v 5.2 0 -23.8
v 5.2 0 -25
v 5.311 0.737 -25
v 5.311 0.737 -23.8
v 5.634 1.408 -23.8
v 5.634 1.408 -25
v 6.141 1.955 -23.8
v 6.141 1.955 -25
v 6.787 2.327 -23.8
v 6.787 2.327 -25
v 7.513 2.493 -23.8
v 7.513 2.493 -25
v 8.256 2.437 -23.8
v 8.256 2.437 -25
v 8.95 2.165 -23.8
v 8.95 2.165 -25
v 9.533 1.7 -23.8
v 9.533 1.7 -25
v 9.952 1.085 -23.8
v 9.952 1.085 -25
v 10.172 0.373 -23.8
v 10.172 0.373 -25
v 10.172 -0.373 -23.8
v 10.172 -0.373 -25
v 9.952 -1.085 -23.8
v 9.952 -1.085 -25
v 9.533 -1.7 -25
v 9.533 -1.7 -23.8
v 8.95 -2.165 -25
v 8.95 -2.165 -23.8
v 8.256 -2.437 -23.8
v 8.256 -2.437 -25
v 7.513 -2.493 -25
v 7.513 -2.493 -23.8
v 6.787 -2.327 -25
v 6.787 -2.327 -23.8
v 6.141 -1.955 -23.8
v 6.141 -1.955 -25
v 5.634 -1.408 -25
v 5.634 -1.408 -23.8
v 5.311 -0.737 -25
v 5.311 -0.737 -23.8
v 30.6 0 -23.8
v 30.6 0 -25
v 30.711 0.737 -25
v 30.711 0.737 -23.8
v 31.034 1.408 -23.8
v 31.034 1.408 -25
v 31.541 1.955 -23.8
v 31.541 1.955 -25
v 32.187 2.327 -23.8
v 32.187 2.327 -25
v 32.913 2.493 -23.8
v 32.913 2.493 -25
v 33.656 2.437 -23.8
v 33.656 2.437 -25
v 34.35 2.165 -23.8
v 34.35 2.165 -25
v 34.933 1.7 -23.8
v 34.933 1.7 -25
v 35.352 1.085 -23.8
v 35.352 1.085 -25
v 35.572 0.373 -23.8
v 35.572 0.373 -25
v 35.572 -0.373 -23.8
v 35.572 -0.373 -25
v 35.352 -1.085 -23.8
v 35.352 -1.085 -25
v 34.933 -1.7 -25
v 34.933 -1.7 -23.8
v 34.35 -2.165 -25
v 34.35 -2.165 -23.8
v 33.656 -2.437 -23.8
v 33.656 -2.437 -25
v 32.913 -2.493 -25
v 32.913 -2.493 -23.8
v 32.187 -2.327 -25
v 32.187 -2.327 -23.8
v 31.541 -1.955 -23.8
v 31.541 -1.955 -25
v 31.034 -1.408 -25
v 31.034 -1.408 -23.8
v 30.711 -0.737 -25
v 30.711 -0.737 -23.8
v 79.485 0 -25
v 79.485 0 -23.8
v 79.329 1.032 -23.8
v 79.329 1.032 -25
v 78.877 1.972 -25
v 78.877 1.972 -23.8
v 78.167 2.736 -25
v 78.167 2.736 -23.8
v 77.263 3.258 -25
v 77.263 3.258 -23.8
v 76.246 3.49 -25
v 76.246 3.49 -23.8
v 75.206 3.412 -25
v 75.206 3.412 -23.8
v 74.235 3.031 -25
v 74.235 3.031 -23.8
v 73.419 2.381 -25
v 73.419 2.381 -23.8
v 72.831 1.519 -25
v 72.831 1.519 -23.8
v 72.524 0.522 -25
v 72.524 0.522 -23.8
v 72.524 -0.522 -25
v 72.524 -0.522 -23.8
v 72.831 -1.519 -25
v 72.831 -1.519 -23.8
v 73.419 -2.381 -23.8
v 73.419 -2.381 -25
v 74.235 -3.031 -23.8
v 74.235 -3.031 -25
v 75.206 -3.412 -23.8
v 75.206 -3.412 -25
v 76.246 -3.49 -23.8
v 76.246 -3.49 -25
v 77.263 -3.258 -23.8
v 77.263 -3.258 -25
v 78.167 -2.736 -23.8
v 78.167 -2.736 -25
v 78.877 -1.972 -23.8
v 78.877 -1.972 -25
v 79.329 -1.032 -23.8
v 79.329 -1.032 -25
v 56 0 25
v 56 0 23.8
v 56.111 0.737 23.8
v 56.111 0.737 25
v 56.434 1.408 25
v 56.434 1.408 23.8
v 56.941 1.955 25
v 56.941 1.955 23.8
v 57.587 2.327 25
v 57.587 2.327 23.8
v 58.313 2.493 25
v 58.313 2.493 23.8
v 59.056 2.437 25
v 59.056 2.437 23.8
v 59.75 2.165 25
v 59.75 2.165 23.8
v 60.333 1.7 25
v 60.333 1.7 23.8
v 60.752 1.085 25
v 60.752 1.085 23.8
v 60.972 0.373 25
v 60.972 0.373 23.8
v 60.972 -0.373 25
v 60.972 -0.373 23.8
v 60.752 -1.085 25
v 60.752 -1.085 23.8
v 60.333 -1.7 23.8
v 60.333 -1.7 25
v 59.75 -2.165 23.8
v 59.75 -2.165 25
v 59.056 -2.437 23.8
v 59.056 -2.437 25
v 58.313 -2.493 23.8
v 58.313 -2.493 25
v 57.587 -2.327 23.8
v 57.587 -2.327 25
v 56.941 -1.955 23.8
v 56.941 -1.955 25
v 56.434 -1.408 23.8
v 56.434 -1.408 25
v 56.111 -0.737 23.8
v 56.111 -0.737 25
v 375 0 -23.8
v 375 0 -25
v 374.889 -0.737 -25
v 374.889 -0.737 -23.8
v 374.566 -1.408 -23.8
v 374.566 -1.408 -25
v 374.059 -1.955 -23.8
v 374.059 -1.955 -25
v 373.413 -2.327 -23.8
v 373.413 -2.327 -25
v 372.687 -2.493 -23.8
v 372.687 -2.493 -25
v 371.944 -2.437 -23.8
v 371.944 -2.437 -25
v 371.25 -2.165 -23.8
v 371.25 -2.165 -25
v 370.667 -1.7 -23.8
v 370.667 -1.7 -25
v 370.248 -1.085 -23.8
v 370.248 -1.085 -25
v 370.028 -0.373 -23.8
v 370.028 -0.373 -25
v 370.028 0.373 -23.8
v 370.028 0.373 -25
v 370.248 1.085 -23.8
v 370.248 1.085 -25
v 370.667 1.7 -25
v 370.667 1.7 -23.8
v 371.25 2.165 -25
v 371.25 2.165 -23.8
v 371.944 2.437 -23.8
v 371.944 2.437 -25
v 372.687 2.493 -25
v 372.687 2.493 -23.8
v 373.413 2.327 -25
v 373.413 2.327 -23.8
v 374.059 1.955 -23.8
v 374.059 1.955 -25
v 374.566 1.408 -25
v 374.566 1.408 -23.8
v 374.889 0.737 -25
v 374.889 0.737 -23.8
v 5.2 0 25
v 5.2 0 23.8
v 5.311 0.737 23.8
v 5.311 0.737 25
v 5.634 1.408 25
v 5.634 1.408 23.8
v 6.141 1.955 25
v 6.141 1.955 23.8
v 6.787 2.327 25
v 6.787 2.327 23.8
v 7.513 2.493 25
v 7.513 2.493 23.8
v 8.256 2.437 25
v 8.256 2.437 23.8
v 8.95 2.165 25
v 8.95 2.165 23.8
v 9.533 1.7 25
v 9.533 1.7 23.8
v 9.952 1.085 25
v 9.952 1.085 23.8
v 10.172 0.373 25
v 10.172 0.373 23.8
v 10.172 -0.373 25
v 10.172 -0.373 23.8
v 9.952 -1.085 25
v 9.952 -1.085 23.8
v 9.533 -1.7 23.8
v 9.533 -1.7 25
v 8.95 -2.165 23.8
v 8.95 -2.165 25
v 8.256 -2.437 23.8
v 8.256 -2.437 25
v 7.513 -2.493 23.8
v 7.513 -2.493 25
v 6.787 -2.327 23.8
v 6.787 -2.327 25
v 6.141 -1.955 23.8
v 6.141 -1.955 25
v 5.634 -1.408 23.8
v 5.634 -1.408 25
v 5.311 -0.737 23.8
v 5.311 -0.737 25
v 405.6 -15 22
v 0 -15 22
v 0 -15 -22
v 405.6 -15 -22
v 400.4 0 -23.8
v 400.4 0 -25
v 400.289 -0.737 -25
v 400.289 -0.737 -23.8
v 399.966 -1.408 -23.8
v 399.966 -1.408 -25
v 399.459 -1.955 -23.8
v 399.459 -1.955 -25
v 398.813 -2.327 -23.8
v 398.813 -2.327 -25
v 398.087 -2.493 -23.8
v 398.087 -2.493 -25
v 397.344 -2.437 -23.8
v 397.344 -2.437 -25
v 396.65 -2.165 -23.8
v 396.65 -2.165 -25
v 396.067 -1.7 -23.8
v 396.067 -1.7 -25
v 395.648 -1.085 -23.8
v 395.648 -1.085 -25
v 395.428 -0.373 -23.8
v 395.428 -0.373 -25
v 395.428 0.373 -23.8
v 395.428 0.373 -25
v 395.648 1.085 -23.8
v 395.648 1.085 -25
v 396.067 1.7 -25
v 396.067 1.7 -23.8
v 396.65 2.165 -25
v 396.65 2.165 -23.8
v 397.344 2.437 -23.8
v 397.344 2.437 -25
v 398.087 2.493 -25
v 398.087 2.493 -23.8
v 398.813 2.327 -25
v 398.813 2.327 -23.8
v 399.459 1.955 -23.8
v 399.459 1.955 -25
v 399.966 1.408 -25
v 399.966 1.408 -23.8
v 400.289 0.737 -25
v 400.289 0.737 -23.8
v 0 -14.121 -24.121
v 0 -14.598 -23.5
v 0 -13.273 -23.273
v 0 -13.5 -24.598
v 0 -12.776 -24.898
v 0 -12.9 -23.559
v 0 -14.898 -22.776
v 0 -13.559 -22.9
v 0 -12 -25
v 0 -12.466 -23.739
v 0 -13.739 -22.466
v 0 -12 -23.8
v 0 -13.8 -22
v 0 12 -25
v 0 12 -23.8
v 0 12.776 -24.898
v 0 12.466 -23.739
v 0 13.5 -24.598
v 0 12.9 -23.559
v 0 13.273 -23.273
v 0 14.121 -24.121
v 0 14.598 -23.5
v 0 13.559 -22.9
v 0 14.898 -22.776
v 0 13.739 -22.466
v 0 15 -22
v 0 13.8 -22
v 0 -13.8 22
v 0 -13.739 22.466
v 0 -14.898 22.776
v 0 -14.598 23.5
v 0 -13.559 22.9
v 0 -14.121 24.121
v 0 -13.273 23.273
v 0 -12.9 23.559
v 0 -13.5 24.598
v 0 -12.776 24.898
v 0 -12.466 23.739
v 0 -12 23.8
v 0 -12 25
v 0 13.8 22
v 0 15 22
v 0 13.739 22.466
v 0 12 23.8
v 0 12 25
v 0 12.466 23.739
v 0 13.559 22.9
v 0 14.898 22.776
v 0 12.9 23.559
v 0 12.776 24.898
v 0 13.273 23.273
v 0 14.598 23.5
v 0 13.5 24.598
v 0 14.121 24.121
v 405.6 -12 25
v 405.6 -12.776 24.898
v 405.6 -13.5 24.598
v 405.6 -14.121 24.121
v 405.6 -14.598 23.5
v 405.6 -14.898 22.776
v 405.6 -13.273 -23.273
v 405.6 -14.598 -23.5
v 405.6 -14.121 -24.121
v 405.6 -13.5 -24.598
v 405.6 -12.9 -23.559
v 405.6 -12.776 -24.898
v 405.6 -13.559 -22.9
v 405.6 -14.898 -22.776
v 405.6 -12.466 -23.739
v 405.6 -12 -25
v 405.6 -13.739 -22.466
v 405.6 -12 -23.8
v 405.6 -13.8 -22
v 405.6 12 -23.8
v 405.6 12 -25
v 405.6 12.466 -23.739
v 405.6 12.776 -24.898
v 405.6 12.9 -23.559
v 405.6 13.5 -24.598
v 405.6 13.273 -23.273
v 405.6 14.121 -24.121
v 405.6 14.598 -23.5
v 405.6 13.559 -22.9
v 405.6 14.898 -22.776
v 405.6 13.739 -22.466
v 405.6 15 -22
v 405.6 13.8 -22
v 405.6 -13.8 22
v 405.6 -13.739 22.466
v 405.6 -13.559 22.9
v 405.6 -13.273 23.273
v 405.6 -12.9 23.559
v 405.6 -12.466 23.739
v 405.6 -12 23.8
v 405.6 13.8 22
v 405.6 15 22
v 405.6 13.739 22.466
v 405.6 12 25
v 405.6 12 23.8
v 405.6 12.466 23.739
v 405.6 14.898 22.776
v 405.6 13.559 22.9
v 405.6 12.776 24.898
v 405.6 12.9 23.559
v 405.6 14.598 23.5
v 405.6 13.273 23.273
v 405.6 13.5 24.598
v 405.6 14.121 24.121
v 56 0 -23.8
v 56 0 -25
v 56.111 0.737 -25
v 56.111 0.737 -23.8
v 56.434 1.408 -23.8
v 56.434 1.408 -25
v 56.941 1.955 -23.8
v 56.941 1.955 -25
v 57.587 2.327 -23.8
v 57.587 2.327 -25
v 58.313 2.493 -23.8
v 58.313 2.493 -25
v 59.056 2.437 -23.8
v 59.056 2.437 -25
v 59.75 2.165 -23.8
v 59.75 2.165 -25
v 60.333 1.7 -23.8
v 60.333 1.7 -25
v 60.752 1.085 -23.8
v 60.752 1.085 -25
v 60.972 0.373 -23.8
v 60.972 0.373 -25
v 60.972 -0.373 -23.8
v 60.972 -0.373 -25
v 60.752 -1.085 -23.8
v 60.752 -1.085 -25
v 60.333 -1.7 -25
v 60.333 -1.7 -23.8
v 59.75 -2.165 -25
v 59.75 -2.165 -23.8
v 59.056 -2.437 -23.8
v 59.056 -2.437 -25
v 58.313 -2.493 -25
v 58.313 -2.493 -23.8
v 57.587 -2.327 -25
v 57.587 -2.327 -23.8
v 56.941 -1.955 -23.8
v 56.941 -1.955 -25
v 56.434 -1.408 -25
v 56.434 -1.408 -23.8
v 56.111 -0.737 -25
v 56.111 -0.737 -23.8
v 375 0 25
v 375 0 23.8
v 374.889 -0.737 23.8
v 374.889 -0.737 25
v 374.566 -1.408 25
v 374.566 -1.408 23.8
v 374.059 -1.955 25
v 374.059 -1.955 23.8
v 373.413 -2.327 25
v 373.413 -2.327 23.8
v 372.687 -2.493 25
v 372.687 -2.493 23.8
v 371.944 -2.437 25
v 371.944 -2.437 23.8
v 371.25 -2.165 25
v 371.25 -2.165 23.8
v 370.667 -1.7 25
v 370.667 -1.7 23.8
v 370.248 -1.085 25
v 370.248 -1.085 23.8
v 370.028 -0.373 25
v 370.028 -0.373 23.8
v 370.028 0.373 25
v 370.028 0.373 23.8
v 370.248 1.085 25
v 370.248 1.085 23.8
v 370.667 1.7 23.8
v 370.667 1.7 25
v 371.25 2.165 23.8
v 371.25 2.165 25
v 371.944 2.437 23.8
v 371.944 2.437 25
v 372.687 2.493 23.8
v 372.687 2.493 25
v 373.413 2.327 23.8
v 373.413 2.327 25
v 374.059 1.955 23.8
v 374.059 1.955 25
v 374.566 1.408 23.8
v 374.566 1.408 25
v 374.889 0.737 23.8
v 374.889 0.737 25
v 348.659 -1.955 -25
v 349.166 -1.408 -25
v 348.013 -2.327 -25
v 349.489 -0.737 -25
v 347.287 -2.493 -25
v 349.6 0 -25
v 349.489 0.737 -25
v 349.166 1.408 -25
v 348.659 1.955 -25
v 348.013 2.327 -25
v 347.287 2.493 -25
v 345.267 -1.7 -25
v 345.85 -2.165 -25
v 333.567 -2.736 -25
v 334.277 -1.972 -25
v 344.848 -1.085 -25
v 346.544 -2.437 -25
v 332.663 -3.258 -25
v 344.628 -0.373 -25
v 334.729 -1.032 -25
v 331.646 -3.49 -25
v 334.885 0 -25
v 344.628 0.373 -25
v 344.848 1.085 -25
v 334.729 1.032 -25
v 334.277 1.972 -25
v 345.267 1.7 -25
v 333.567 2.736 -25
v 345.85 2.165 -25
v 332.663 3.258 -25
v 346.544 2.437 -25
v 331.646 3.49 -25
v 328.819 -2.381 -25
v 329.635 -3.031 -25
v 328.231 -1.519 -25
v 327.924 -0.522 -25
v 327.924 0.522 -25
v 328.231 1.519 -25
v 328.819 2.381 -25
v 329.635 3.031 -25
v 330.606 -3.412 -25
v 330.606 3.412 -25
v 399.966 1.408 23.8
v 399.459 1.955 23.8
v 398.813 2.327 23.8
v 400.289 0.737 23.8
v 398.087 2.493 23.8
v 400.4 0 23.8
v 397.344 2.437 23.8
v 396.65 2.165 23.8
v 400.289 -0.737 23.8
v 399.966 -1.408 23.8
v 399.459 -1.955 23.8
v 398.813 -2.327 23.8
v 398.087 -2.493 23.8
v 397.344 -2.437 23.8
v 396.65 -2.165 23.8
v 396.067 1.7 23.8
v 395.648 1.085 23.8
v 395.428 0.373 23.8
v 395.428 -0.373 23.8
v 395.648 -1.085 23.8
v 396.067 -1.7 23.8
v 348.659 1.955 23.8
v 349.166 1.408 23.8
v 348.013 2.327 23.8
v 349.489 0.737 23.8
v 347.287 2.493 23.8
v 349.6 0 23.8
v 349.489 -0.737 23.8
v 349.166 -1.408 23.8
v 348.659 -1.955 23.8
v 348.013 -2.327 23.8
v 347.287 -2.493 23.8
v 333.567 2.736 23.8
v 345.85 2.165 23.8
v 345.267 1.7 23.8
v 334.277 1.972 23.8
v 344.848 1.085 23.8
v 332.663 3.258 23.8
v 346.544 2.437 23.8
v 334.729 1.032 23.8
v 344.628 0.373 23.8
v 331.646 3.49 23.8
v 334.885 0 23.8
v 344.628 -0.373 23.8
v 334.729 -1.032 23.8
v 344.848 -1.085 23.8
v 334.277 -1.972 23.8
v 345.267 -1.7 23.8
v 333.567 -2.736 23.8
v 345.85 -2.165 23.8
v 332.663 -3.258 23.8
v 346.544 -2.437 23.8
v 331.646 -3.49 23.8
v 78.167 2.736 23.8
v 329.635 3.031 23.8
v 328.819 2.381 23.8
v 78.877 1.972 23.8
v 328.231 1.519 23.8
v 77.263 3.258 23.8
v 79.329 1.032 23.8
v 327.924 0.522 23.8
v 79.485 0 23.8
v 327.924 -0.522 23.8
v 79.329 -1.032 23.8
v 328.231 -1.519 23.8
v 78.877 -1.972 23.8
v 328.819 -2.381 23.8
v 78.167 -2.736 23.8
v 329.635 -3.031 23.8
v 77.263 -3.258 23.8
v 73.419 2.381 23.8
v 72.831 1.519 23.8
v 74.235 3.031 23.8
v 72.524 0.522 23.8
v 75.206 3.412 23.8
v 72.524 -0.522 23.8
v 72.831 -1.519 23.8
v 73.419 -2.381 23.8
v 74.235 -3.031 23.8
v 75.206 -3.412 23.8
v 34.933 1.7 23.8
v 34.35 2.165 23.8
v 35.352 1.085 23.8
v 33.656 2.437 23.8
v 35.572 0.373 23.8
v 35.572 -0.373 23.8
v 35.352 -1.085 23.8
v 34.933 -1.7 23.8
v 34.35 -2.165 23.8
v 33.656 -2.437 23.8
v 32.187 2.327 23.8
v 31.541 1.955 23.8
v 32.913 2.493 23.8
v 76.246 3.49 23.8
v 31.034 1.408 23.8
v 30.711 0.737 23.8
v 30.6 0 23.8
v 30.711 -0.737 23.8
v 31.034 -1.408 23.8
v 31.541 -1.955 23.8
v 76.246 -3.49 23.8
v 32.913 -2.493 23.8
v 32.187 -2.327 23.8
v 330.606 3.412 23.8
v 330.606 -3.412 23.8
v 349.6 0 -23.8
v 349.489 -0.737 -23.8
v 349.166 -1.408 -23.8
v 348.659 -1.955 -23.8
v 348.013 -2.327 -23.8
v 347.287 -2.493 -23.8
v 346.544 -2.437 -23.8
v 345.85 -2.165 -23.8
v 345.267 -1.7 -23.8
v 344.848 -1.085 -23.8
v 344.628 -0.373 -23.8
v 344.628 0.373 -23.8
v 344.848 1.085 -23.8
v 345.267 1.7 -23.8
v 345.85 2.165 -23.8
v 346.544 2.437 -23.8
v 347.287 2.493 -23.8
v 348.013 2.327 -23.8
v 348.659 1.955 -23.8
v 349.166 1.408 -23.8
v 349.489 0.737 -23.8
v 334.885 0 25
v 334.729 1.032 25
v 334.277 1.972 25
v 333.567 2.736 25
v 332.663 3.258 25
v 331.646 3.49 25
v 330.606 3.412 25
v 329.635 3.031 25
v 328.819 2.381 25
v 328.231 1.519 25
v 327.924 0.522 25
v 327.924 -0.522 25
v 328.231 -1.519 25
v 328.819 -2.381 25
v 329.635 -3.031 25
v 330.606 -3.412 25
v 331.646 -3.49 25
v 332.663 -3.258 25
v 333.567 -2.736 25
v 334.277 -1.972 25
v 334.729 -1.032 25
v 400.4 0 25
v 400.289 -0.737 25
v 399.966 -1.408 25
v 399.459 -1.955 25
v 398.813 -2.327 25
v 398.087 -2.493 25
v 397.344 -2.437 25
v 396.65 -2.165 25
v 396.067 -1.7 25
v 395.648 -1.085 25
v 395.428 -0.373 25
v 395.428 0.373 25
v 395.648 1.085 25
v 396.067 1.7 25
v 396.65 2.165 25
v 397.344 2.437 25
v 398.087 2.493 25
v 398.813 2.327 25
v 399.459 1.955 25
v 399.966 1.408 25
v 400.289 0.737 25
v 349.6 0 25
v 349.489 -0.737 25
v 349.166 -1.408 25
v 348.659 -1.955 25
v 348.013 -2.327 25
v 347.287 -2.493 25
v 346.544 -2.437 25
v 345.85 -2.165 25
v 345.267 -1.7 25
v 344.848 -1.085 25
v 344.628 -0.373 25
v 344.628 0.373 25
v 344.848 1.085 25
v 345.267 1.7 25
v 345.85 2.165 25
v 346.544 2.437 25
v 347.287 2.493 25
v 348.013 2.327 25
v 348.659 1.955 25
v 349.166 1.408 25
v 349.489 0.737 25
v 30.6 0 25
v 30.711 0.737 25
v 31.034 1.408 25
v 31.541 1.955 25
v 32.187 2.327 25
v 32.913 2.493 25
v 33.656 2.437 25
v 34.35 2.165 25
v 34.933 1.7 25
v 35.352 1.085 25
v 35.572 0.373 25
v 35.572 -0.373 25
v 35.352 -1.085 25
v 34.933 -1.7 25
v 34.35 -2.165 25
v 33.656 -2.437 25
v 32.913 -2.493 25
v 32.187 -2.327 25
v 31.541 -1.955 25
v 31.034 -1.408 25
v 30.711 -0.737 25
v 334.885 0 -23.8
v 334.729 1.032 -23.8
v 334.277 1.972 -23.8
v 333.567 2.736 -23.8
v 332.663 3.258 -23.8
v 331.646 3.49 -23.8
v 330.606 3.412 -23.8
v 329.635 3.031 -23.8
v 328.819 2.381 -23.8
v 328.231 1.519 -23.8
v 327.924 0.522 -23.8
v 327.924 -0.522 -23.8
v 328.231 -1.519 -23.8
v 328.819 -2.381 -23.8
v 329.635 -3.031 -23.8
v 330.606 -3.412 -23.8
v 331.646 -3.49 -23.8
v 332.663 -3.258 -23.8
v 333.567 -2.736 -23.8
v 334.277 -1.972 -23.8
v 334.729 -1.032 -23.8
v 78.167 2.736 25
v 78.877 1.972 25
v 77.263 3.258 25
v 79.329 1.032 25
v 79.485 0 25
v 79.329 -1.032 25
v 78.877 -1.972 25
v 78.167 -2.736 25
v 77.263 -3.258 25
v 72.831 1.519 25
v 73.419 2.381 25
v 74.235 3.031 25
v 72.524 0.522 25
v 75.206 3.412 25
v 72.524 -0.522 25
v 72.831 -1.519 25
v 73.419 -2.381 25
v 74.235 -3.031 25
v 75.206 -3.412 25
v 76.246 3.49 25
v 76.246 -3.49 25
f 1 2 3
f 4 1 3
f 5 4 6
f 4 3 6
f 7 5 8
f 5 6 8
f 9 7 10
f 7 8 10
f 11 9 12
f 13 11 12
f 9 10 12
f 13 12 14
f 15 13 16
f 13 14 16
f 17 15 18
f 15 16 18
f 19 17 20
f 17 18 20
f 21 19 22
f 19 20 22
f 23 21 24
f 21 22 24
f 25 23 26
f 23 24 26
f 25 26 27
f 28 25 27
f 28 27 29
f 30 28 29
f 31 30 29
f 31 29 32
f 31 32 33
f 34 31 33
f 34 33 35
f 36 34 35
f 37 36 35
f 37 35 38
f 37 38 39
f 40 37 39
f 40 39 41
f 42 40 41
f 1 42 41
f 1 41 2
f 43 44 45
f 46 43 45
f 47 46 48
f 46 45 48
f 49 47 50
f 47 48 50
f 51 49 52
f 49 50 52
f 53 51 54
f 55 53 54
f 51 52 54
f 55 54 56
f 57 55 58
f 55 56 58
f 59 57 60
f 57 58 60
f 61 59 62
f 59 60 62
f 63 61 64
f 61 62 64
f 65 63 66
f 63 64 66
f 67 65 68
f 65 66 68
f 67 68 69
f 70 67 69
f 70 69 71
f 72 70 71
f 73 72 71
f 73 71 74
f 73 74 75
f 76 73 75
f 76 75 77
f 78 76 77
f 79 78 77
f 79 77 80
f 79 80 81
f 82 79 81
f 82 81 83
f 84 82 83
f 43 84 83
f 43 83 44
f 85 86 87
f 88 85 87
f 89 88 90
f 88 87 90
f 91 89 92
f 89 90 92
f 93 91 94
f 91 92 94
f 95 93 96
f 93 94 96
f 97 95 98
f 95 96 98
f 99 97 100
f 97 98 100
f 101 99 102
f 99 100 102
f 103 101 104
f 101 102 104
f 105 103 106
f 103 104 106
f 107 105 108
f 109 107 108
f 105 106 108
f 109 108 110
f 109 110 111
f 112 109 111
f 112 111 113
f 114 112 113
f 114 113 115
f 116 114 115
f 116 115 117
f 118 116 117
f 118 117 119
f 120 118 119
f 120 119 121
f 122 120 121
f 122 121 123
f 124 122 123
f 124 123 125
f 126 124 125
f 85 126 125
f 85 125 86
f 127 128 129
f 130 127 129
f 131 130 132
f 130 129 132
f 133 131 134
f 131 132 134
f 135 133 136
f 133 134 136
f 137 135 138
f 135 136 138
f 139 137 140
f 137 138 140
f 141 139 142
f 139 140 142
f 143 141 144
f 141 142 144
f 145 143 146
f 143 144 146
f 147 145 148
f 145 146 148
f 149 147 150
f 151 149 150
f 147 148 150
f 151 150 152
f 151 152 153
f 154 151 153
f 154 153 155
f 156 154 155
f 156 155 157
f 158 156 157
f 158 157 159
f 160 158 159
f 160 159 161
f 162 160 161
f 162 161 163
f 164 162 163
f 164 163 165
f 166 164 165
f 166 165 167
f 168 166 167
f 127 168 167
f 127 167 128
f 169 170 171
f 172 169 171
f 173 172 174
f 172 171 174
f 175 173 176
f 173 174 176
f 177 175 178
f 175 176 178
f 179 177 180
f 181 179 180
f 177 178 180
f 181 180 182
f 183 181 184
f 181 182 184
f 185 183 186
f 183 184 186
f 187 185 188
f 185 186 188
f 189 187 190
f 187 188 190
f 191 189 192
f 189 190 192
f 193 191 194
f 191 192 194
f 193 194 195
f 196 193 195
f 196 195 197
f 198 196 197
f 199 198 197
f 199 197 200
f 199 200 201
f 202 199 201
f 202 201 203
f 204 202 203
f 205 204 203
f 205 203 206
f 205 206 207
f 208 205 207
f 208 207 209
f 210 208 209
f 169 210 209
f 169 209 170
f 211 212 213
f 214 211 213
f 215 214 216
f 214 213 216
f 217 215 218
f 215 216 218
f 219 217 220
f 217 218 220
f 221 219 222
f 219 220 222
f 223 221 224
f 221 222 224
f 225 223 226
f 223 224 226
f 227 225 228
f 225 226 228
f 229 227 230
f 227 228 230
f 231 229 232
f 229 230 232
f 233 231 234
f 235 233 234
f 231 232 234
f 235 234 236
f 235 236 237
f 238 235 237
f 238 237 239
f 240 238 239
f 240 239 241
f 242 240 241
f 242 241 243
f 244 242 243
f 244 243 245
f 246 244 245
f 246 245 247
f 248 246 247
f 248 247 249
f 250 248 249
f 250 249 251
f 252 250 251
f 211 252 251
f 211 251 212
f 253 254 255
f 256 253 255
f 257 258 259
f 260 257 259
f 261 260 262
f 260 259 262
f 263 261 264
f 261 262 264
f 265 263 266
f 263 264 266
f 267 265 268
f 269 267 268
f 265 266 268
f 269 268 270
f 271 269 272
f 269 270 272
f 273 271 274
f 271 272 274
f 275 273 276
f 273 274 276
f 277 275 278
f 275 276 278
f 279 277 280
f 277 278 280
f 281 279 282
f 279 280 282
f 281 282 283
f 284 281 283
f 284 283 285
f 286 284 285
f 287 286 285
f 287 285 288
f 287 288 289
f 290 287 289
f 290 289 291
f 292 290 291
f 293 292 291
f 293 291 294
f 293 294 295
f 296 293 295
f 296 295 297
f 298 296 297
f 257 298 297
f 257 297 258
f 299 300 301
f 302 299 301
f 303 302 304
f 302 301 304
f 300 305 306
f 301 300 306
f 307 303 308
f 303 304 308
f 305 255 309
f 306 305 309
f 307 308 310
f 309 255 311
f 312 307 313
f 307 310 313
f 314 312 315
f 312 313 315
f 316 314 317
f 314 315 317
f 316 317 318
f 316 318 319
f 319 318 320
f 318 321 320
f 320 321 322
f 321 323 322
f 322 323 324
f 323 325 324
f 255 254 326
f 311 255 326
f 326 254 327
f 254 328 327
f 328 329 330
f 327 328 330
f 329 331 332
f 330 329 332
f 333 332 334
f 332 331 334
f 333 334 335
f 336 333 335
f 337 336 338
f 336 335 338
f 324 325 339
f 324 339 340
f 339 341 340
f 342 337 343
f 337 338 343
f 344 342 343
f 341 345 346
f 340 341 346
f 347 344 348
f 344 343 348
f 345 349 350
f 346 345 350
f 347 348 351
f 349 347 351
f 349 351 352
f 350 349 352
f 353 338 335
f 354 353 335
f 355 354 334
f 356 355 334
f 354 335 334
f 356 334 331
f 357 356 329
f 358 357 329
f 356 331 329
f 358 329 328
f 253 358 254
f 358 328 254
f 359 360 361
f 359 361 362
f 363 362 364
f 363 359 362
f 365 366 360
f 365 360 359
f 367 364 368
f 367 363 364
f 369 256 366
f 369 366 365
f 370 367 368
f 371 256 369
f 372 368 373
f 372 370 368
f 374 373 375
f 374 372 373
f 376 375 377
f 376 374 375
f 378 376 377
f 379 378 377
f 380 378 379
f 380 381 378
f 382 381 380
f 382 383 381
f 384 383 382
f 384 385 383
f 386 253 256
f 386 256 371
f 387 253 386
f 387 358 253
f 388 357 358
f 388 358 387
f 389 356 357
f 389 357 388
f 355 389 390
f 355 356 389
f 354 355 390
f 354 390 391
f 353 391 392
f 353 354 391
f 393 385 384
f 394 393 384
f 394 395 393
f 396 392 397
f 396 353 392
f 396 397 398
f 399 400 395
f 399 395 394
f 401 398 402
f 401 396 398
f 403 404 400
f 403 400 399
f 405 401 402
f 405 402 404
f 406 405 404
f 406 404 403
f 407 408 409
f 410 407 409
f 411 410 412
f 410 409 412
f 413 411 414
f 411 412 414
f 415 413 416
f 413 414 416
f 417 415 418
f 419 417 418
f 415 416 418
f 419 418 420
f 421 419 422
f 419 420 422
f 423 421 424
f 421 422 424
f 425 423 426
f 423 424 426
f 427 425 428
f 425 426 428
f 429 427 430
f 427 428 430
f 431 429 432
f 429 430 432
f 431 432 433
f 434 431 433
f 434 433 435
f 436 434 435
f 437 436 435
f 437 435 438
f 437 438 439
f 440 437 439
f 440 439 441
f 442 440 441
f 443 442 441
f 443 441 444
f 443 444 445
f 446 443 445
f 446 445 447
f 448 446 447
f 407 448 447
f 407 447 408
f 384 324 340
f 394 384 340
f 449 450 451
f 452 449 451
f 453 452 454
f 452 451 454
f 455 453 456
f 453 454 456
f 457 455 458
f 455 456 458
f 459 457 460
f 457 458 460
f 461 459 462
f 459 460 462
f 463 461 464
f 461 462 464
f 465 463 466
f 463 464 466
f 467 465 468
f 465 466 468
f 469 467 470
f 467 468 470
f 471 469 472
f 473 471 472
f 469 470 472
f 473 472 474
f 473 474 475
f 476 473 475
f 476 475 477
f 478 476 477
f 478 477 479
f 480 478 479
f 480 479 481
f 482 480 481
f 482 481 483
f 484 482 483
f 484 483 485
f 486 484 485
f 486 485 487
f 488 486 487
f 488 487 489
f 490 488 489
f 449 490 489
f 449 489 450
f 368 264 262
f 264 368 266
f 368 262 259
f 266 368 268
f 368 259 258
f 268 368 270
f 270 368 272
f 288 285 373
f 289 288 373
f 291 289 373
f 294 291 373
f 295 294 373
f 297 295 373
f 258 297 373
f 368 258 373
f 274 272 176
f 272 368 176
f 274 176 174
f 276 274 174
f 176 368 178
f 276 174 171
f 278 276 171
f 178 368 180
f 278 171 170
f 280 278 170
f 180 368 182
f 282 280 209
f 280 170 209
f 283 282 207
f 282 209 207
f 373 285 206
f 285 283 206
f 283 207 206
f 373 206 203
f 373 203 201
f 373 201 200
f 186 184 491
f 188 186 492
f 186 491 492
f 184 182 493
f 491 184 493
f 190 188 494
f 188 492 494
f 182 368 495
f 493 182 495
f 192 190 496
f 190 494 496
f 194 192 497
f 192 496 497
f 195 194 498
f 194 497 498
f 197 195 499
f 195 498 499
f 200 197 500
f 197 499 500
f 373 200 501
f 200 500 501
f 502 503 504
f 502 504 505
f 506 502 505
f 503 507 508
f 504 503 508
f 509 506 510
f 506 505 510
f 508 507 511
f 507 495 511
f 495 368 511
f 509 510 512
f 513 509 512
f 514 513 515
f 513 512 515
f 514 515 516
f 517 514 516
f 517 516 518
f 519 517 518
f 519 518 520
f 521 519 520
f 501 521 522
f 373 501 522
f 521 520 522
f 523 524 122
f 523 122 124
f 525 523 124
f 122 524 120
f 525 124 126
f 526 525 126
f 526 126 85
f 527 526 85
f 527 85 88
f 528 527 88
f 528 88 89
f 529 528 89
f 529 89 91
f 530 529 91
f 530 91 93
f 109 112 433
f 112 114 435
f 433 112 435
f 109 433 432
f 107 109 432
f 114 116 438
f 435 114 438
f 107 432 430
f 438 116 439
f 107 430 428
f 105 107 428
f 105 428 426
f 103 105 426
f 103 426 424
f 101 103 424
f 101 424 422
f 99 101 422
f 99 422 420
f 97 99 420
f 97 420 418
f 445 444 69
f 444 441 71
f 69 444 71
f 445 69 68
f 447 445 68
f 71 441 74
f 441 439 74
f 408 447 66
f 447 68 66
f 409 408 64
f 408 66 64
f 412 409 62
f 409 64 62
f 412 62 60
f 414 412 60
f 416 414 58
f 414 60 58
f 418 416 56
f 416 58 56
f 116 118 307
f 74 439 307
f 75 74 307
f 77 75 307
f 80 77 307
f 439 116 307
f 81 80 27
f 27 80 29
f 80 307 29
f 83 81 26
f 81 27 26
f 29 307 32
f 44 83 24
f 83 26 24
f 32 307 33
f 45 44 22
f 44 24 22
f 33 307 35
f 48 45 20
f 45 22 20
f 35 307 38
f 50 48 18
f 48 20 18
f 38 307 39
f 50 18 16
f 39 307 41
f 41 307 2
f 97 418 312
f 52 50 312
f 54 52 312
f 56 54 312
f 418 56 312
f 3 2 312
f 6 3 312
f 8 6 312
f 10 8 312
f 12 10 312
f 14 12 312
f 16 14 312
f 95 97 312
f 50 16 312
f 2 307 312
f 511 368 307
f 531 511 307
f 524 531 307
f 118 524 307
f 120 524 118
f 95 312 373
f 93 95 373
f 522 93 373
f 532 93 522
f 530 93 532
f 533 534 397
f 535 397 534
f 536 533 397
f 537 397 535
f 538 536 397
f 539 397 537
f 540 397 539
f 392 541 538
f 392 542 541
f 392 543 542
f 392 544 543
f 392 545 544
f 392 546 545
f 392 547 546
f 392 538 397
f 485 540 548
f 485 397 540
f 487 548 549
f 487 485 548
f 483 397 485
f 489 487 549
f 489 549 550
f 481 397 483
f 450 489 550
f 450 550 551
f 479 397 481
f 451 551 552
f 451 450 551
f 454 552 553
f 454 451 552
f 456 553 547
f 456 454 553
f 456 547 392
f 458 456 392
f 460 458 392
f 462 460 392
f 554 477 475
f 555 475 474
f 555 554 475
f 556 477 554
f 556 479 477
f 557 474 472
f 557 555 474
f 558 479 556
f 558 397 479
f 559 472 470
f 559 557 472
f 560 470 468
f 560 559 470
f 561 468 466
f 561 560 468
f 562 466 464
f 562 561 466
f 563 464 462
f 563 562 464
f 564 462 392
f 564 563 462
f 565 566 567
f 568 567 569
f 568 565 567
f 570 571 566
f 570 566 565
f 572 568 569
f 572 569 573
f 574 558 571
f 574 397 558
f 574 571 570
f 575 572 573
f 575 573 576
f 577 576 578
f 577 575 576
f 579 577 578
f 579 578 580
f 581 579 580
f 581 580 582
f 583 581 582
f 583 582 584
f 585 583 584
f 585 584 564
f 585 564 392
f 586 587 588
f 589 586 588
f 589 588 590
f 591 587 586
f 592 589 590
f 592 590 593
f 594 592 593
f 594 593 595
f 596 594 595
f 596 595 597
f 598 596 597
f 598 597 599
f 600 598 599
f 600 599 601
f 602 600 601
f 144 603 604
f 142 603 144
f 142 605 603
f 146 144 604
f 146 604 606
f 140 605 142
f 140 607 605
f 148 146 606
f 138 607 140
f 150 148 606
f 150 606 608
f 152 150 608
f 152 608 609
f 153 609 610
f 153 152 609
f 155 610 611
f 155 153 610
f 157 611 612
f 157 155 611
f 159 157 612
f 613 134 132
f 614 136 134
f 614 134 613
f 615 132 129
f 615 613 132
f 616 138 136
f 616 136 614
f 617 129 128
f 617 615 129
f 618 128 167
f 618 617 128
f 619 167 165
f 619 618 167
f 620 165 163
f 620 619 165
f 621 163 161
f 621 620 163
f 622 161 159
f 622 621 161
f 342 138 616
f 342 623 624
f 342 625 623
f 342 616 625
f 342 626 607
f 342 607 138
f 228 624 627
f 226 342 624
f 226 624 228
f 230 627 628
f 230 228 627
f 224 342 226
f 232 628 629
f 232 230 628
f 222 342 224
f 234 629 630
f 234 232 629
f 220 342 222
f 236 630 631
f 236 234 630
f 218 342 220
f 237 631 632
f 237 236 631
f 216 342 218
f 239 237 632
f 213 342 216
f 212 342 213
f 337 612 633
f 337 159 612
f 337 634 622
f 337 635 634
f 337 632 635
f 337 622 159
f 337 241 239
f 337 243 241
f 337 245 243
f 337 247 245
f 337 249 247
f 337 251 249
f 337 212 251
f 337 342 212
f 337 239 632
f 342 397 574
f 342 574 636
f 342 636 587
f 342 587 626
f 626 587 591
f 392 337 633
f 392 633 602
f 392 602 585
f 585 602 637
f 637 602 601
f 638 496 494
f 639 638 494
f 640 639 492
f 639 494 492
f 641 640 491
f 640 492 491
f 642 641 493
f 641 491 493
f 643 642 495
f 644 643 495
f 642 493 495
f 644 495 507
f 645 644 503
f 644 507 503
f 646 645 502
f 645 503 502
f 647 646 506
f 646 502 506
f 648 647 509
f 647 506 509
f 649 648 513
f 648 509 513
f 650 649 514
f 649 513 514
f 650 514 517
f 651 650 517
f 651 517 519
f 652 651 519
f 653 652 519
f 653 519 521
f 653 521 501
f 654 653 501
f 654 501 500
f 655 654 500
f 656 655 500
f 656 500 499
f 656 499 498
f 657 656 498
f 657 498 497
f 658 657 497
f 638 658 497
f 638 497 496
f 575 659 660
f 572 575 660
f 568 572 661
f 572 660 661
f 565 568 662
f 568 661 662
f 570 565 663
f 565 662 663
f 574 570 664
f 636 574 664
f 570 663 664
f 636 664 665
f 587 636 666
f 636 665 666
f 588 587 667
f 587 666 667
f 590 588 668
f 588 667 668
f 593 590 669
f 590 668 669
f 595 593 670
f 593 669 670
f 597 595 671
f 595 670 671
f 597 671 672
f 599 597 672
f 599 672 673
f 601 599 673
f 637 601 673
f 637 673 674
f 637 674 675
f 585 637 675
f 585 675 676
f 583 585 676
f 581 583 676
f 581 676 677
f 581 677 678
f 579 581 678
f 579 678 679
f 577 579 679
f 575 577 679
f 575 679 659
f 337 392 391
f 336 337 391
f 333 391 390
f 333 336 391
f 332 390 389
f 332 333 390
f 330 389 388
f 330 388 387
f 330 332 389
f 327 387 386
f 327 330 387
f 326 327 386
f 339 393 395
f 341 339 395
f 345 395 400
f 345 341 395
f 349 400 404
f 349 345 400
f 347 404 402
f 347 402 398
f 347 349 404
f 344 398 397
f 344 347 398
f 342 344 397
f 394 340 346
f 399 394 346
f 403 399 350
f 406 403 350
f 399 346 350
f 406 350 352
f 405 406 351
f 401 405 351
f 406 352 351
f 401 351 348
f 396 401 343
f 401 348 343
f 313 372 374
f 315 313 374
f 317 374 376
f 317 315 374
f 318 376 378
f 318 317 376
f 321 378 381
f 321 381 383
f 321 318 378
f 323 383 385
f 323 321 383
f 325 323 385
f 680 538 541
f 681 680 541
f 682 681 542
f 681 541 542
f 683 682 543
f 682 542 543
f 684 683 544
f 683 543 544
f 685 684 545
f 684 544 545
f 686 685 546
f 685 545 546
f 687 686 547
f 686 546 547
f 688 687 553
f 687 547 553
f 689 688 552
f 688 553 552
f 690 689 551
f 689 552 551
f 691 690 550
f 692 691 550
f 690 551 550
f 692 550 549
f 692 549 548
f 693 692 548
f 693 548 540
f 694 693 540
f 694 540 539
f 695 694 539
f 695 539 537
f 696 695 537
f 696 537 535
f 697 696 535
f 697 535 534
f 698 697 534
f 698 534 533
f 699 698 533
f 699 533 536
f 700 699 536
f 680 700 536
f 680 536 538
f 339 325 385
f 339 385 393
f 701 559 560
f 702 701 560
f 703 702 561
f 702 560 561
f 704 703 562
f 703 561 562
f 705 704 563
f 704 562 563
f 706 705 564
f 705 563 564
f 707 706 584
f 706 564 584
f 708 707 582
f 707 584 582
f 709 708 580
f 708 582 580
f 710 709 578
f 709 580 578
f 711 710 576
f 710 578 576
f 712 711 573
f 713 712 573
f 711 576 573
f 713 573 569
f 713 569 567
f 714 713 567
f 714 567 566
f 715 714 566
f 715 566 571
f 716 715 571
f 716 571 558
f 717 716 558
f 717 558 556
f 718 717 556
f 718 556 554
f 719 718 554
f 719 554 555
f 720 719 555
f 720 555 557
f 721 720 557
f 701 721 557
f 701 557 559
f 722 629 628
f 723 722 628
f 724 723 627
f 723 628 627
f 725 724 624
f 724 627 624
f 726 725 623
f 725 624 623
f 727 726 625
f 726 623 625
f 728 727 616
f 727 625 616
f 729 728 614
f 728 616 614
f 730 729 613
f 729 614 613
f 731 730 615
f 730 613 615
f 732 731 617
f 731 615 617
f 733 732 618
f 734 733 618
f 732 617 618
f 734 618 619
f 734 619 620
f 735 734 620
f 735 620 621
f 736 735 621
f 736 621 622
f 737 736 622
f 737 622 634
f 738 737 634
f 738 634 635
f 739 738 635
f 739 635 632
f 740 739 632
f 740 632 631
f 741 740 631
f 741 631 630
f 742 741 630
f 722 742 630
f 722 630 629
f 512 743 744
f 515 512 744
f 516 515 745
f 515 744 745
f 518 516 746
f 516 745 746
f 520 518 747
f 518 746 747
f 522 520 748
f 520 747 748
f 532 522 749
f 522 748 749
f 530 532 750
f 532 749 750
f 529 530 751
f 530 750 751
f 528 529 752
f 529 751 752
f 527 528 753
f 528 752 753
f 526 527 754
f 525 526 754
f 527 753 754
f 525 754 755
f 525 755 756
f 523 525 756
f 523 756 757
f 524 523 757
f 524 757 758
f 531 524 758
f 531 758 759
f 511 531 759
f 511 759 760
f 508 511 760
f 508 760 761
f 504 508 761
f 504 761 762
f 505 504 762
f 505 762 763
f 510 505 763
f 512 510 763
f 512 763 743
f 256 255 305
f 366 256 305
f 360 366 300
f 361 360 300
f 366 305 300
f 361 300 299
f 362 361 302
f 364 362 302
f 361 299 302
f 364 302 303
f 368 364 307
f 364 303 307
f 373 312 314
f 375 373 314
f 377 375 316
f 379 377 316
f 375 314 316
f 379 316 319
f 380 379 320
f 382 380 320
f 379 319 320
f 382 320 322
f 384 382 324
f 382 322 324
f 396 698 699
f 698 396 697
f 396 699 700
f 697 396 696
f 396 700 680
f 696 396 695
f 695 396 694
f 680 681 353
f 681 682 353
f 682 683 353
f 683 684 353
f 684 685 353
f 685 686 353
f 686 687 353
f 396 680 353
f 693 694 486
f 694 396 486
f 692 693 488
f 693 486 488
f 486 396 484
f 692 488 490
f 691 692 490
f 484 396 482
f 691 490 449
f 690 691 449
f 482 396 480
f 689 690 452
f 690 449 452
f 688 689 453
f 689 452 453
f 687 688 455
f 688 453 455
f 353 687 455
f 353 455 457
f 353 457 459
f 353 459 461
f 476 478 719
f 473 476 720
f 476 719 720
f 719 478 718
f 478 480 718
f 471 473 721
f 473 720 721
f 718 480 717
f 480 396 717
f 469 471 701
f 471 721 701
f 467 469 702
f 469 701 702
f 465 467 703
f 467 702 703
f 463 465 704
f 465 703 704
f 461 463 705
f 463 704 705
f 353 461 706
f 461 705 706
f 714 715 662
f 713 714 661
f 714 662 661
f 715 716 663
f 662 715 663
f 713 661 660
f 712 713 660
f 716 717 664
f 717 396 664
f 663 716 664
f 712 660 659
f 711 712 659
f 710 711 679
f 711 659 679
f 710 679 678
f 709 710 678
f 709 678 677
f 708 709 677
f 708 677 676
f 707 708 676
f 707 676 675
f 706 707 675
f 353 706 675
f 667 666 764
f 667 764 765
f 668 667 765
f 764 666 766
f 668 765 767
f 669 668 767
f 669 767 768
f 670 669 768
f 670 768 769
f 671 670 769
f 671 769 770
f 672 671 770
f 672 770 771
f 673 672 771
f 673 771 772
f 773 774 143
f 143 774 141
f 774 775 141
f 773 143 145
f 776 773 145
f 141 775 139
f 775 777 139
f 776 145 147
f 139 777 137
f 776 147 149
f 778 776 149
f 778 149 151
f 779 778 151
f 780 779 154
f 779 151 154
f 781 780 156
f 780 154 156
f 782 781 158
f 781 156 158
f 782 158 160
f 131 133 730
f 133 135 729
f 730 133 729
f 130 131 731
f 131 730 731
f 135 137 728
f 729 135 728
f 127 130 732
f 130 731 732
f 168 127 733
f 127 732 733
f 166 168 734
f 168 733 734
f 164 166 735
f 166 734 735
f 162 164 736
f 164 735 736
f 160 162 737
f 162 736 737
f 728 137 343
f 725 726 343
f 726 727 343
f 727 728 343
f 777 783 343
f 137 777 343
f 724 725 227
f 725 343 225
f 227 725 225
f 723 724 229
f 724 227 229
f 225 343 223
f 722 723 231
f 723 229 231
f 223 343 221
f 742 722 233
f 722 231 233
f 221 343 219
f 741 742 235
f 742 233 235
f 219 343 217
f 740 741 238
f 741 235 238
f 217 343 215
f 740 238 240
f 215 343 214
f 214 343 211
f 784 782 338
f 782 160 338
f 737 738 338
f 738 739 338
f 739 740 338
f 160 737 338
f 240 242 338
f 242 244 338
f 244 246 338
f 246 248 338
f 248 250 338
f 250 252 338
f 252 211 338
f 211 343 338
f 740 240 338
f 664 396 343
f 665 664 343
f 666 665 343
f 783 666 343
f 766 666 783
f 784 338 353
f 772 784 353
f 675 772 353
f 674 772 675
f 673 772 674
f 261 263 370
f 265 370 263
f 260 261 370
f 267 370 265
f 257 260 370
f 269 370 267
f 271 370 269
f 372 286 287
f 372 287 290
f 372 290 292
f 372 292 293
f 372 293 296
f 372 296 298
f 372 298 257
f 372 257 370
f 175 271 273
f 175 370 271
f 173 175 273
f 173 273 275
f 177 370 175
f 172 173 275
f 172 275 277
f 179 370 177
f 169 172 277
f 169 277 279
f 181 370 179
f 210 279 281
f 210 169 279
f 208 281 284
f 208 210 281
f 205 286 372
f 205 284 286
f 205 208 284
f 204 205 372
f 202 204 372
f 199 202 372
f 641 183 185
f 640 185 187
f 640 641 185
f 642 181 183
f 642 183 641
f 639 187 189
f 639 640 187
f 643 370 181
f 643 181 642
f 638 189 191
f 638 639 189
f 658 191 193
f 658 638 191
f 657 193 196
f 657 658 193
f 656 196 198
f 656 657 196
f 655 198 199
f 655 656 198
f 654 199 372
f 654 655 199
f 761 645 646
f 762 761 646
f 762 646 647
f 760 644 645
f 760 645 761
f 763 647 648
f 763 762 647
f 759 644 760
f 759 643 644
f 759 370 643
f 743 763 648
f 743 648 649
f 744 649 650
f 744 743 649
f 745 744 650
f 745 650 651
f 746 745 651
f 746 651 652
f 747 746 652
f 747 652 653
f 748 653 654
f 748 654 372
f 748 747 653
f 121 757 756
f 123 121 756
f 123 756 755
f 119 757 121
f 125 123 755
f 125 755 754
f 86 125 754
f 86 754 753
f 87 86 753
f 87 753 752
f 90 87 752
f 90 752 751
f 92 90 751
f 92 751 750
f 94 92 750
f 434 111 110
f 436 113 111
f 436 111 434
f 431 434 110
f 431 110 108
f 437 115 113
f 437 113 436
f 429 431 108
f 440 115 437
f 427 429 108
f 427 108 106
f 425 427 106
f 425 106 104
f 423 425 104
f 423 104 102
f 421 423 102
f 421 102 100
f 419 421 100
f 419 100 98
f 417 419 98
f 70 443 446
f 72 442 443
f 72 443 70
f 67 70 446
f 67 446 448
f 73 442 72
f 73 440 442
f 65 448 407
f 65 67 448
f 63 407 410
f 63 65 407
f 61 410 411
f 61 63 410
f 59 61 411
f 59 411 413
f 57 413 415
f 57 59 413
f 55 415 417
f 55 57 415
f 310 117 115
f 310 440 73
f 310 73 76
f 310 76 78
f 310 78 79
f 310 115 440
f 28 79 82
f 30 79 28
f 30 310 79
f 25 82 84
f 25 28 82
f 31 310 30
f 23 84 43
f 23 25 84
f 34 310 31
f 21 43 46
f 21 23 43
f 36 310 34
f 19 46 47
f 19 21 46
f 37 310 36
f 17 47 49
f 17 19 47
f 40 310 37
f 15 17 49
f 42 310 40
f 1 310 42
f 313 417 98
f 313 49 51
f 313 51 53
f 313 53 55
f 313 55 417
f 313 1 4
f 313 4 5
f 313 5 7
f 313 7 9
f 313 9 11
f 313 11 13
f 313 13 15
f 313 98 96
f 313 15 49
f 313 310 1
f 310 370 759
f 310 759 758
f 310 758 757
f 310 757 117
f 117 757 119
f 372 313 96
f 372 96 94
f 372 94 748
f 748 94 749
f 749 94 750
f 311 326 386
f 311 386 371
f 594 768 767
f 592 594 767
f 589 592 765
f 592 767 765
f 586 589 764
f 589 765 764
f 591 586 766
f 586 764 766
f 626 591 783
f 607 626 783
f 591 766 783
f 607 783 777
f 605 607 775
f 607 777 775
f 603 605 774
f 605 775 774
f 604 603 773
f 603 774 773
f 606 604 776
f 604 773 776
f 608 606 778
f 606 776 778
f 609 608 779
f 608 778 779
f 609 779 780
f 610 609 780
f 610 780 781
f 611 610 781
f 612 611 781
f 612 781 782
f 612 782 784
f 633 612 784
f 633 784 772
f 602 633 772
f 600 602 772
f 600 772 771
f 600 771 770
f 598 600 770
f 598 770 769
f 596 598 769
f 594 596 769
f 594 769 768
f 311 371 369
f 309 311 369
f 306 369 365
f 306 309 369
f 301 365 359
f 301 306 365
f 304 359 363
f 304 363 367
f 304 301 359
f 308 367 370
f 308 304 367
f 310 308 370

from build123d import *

# Parameters (mm, degrees)
TUBO_RETANGULAR_50_X_30_X_2_6_1_DEPTH = 405.6
ESBO_O2_R                             = 2.5
CORTE_EXTRUS_O1_DEPTH                 = 409.945424232
ESBO_O3_R                             = 3.5
CORTE_EXTRUS_O2_DEPTH                 = 409.945424232


with BuildPart() as part:
    # Sketch1 → Tubo retangular 50 X 30 X 2.6(1) (new body)
    with BuildSketch(Plane.YZ):
        with BuildLine():
            Line((-12, -25), (12, -25))
            ThreePointArc((12, -25), (14.121320344, -24.121320344), (15, -22))
            Line((15, -22), (15, 22))
            ThreePointArc((15, 22), (14.121320344, 24.121320344), (12, 25))
            Line((12, 25), (-12, 25))
            ThreePointArc((-12, 25), (-14.121320344, 24.121320344), (-15, 22))
            Line((-15, 22), (-15, -22))
            ThreePointArc((-15, -22), (-14.121320344, -24.121320344), (-12, -25))
        make_face()
        with BuildLine():
            Line((-12, -23.8), (12, -23.8))
            ThreePointArc((12, -23.8), (13.272792206, -23.272792206), (13.8, -22))
            Line((13.8, -22), (13.8, 22))
            ThreePointArc((13.8, 22), (13.272792206, 23.272792206), (12, 23.8))
            Line((12, 23.8), (-12, 23.8))
            ThreePointArc((-12, 23.8), (-13.272792206, 23.272792206), (-13.8, 22))
            Line((-13.8, 22), (-13.8, -22))
            ThreePointArc((-13.8, -22), (-13.272792206, -23.272792206), (-12, -23.8))
        make_face(mode=Mode.SUBTRACT)
    extrude(amount=TUBO_RETANGULAR_50_X_30_X_2_6_1_DEPTH)

    # Esboço2 → Corte-extrusão1 (cut, through all)
    with BuildSketch(Plane(origin=(0, 0, -25), x_dir=(-1, 0, 0), z_dir=(0, 0, -1))):
        with Locations((-58.5, 0)):
            Circle(ESBO_O2_R)
        with Locations((-33.1, 0)):
            Circle(ESBO_O2_R)
        with Locations((-7.7, 0)):
            Circle(ESBO_O2_R)
        with Locations(Location((-397.9, 0, 0), (0, 0, 180))):
            Circle(ESBO_O2_R)
        with Locations(Location((-372.5, 0, 0), (0, 0, 180))):
            Circle(ESBO_O2_R)
        with Locations(Location((-347.1, 0, 0), (0, 0, 180))):
            Circle(ESBO_O2_R)
    extrude(amount=-CORTE_EXTRUS_O1_DEPTH, mode=Mode.SUBTRACT)

    # Esboço3 → Corte-extrusão2 (cut, through all)
    with BuildSketch(Plane.XY.offset(25)):
        with Locations((75.984705047, 0)):
            Circle(ESBO_O3_R)
        with Locations((331.384705047, 0)):
            Circle(ESBO_O3_R)
    extrude(amount=-CORTE_EXTRUS_O2_DEPTH, mode=Mode.SUBTRACT)


solid = part.part
